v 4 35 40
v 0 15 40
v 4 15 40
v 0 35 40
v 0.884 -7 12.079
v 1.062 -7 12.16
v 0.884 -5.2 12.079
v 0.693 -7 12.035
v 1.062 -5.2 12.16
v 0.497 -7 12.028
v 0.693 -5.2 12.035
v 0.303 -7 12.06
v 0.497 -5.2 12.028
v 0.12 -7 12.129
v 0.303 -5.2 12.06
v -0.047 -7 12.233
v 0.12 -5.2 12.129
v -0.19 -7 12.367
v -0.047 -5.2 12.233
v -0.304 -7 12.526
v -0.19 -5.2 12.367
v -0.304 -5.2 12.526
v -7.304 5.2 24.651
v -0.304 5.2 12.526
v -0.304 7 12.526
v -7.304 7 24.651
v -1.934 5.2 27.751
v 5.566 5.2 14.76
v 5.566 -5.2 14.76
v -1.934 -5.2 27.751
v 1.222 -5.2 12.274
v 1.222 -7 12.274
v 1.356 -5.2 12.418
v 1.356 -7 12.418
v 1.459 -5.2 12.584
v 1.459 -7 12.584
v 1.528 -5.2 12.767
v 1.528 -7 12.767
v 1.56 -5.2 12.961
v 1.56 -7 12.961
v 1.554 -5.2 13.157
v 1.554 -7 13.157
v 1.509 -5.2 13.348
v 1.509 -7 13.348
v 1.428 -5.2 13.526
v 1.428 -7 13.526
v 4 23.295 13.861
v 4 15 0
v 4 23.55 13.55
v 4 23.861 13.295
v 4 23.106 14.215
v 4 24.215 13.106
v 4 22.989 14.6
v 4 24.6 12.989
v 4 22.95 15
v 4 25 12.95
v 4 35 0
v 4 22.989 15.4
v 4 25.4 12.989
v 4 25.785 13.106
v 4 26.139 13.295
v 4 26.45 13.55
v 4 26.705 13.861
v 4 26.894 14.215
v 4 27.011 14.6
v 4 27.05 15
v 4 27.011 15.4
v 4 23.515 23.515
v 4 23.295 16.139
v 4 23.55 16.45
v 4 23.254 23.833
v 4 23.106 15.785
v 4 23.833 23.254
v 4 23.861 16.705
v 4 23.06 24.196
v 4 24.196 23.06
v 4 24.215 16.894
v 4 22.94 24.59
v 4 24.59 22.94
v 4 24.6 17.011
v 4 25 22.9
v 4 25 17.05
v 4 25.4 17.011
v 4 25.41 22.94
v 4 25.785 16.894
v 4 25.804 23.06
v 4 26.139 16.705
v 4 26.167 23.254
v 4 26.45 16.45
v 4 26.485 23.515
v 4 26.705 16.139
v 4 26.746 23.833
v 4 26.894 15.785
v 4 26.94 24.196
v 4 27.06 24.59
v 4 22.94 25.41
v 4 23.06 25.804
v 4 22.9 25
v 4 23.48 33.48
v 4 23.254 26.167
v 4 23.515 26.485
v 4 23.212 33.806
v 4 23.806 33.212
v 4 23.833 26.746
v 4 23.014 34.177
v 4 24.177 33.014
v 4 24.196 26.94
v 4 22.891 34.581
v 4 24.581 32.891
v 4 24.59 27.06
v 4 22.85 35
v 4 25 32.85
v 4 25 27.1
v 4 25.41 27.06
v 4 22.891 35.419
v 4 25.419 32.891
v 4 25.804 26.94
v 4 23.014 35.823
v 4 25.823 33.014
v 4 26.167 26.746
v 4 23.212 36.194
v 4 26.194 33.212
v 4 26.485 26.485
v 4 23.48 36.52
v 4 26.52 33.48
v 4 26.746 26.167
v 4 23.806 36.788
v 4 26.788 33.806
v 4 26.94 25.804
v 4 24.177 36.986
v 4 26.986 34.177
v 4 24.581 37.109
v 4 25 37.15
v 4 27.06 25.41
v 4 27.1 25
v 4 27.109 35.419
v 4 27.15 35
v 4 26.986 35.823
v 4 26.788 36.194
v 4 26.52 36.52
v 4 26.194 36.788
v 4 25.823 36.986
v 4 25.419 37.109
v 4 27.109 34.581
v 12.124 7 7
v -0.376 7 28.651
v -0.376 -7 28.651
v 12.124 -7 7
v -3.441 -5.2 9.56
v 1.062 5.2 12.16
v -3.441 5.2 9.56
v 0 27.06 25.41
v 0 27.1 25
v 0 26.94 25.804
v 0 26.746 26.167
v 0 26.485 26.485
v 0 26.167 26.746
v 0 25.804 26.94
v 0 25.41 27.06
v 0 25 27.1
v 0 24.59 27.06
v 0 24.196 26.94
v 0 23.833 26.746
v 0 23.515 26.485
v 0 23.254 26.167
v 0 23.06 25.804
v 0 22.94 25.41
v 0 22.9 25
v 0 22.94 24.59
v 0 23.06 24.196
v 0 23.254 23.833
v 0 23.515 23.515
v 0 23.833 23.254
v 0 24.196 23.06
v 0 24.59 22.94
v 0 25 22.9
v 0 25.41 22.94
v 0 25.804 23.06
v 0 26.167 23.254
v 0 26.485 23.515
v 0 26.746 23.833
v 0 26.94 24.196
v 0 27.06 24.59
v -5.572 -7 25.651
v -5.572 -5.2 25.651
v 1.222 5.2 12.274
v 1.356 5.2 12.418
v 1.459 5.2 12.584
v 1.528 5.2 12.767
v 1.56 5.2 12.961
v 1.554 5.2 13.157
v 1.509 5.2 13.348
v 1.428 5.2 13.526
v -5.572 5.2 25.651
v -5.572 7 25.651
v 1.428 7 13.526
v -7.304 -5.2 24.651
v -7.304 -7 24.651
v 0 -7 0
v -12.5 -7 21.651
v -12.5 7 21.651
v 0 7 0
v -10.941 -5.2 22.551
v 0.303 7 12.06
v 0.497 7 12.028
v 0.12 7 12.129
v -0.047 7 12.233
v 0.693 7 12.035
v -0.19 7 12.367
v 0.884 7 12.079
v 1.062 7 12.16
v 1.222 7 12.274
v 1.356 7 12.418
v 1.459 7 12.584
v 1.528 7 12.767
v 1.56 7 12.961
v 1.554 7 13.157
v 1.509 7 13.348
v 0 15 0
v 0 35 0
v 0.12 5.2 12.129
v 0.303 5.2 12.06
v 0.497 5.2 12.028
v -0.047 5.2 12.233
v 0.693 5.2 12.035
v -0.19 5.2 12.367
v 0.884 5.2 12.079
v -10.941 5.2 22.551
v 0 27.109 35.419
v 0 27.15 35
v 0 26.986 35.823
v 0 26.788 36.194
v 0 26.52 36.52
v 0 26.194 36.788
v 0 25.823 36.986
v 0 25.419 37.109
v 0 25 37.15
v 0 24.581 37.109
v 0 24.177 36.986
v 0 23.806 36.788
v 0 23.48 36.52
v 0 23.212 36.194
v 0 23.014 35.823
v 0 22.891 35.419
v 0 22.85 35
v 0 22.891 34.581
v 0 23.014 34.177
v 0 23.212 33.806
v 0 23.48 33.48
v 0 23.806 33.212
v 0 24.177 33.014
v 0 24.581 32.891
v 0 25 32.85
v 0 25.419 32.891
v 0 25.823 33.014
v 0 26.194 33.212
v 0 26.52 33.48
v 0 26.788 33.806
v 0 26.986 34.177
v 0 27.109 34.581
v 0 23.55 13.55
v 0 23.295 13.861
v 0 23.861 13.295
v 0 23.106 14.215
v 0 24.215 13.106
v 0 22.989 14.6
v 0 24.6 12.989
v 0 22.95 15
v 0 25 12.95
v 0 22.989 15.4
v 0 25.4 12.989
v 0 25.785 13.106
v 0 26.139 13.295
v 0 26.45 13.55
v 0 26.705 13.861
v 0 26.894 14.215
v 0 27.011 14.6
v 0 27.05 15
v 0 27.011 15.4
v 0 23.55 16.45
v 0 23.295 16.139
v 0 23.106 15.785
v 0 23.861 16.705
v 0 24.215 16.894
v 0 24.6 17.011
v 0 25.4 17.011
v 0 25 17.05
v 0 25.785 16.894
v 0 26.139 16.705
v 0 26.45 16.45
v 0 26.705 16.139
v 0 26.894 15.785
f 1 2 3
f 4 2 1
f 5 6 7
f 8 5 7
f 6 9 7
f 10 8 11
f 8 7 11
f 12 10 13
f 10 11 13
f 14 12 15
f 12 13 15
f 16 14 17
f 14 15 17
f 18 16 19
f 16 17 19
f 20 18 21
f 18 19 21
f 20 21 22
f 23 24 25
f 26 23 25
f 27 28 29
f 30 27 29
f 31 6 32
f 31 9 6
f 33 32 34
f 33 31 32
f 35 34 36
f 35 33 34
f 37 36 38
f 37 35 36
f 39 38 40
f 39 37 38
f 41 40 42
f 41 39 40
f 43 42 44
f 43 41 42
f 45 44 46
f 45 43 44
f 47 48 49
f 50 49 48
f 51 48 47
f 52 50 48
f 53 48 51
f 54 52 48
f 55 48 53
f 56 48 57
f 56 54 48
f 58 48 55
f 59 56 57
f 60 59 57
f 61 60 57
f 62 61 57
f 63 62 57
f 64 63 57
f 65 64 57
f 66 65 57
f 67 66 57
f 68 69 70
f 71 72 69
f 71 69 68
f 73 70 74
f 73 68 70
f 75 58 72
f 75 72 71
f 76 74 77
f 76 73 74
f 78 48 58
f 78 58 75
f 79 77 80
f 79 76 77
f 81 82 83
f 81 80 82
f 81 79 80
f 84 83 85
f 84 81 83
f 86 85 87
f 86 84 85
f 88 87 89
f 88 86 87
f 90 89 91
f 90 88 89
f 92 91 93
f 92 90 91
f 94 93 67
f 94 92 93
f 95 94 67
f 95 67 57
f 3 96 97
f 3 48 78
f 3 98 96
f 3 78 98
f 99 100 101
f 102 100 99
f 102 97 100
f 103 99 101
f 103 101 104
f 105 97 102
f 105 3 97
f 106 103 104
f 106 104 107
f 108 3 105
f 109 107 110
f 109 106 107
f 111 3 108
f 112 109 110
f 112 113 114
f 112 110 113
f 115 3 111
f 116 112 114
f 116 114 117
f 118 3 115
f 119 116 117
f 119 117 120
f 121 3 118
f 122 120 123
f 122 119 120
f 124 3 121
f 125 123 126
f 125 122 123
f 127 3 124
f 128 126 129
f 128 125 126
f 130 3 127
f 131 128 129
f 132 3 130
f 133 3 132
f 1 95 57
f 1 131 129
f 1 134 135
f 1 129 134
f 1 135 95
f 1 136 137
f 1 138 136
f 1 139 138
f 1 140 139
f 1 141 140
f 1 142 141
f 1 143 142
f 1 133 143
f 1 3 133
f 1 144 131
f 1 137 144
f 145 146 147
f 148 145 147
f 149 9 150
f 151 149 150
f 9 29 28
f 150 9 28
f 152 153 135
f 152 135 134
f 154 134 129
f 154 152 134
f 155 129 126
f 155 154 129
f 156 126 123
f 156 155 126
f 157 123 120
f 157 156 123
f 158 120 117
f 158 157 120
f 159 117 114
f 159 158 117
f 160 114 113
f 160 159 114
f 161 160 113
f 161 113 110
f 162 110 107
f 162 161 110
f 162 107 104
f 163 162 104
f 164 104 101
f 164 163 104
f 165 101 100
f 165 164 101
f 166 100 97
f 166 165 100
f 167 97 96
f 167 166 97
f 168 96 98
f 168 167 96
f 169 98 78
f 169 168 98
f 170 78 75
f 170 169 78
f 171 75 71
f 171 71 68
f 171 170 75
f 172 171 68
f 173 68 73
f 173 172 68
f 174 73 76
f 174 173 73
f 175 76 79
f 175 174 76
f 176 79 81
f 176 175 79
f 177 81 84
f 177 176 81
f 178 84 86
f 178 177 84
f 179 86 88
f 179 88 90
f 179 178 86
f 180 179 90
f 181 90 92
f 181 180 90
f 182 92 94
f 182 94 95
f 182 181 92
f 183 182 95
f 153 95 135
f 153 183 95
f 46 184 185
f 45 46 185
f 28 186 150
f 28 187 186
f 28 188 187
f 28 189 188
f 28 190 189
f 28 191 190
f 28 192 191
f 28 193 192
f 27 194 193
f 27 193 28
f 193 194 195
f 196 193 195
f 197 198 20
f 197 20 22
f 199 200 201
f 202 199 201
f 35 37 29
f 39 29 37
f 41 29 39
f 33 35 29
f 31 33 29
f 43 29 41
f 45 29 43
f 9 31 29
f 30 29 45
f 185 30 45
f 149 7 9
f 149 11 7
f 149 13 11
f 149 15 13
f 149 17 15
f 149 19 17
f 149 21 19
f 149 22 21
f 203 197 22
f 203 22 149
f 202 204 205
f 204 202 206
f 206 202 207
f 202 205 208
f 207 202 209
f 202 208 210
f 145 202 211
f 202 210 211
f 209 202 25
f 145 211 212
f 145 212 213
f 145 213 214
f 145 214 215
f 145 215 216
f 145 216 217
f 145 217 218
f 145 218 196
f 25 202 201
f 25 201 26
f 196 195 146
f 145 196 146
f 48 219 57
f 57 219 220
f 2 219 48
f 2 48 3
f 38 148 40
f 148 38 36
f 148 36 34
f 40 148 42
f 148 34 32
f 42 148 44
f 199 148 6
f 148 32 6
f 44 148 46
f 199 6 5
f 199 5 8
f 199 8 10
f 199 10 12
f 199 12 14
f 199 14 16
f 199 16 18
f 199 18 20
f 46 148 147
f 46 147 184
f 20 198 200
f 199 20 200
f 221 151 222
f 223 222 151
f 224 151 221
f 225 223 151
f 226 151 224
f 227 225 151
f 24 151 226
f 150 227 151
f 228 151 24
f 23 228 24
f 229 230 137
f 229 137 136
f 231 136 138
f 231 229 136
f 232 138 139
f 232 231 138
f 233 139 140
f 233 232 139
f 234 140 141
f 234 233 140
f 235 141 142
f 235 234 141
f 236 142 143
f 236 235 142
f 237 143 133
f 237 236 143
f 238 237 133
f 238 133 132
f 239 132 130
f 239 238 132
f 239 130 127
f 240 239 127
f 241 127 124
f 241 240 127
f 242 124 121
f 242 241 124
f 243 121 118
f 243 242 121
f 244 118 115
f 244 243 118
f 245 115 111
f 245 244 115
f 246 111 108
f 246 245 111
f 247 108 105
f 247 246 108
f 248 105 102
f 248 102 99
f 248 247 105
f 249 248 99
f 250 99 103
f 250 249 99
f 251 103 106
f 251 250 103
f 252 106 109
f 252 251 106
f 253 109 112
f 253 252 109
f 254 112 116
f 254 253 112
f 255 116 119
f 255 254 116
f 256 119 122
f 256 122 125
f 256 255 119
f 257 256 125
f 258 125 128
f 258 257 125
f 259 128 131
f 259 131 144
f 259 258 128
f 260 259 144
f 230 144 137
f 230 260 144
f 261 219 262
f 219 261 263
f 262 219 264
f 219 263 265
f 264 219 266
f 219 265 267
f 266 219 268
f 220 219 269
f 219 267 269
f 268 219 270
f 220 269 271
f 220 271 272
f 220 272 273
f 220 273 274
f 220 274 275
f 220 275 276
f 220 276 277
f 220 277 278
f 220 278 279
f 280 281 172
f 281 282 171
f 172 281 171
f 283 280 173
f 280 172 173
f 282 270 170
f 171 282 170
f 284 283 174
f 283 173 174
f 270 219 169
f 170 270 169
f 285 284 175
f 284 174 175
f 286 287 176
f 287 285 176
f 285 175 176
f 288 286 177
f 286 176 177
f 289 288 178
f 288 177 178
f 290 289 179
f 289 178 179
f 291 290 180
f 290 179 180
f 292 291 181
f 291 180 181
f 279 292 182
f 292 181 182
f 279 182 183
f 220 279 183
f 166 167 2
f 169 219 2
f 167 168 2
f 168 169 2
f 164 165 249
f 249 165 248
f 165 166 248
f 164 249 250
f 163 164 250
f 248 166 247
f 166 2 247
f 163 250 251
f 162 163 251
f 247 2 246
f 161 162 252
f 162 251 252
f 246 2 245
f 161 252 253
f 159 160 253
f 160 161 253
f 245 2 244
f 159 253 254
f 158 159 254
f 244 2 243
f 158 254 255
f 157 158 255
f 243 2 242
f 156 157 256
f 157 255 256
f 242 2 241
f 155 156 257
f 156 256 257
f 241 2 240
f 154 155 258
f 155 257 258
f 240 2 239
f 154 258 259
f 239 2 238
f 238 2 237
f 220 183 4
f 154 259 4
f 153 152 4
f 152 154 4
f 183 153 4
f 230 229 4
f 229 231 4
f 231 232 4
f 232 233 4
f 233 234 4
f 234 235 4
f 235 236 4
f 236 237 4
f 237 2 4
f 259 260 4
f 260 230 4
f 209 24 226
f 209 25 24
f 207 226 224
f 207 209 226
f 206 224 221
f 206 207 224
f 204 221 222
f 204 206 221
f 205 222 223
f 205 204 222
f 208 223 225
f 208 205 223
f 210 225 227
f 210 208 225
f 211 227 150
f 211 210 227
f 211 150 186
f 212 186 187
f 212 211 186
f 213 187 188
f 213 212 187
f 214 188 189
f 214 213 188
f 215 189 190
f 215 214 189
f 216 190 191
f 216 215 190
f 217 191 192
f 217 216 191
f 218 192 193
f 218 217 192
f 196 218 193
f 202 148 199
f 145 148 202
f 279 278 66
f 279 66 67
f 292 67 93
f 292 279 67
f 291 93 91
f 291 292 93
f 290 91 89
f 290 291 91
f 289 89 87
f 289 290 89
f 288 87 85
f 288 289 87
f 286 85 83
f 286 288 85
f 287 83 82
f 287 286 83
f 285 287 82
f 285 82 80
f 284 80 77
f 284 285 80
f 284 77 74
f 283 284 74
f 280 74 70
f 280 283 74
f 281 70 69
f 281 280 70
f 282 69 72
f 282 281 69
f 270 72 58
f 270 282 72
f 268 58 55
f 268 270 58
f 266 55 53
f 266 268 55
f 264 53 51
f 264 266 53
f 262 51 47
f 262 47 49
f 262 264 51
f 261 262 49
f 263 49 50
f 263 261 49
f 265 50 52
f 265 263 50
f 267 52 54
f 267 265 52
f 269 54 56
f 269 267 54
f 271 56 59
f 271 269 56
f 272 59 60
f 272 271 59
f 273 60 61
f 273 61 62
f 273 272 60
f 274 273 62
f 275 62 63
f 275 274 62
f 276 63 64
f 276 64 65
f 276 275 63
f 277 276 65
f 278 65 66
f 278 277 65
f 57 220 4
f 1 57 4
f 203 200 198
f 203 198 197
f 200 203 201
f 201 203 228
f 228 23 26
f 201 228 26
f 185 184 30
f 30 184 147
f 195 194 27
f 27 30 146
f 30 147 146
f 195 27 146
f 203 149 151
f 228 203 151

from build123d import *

# Parameters (mm, degrees)
F0_W     = 1.8
F0_H     = 2
F1_DEPTH = 25
F0_W_2   = 20
F0_H_2   = 40
F0_R     = 2.05
F0_R_2   = 2.1
F0_R_3   = 2.15
F2_DEPTH = 4
F3_DEPTH = 15
F4_ANGLE = -60
F6_R     = 0.99999


# Not quite as in the source:
# - a fillet or chamfer is up to 0.001 mm smaller than in the source, because OpenCascade refuses the exact size


with BuildPart() as f1:
    # F0 (on Right) → F1 (new body)
    with BuildSketch(Plane.YZ):
        Polygon((7, 8), (7, 14), (-7, 14), (-7, 8), (-5.2, 8), (-5.2, 12.2), (5.2, 12.2), (5.2, 8), align=None)
        Polygon((7, 0), (7, 6), (5.2, 6), (5.2, 1.8), (-5.2, 1.8), (-5.2, 6), (-7, 6), (-7, 0), align=None)
        with Locations((6.1, 7)):
            Rectangle(F0_W, F0_H)
        Polygon((5.2, 6), (5.2, 8), (5.2, 12.2), (-5.2, 12.2), (-5.2, 8), (-5.2, 6), (-5.2, 1.8), (5.2, 1.8), align=None)
        with Locations((-6.1, 7)):
            Rectangle(F0_W, F0_H)
    extrude(amount=F1_DEPTH)

    # F0 (on Right) → F3 (cut)
    with BuildSketch(Plane.YZ):
        Polygon((5.2, 6), (5.2, 8), (5.2, 12.2), (-5.2, 12.2), (-5.2, 8), (-5.2, 6), (-5.2, 1.8), (5.2, 1.8), align=None)
        with Locations((6.1, 7)):
            Rectangle(F0_W, F0_H)
        with Locations((-6.1, 7)):
            Rectangle(F0_W, F0_H)
    extrude(amount=F3_DEPTH, mode=Mode.SUBTRACT)


with BuildPart() as f2:
    # F0 (on Right) → F2 (new body)
    with BuildSketch(Plane.YZ):
        with Locations((25, 20)):
            Rectangle(F0_W_2, F0_H_2)
        with Locations((25, 15)):
            Circle(F0_R, mode=Mode.SUBTRACT)
        with Locations((25, 25)):
            Circle(F0_R_2, mode=Mode.SUBTRACT)
        with Locations((25, 35)):
            Circle(F0_R_3, mode=Mode.SUBTRACT)
    extrude(amount=F2_DEPTH)


with BuildPart() as f1_1:
    # F4: moved
    add(f1.part.rotate(Axis((25, 0, 0), (0, -1, 0)), F4_ANGLE))


with BuildPart() as f1_2:
    # F5: moved
    add(f1_1.part.moved(Location((-25, 0, 0))))

    # F6 (radius 1 in the source; OpenCascade refuses exactly that, so slightly less here)
    f6_edges = [f1_2.edges().sort_by_distance(p)[0] for p in [
        (1.928203, -6.1, 12.660254),
        (0.196152, -6.1, 11.660254),
        (1.928203, 6.1, 12.660254),
        (0.196152, 6.1, 11.660254),
    ]]
    fillet(f6_edges, radius=F6_R)


solid = Compound([f2.part, f1_2.part])
